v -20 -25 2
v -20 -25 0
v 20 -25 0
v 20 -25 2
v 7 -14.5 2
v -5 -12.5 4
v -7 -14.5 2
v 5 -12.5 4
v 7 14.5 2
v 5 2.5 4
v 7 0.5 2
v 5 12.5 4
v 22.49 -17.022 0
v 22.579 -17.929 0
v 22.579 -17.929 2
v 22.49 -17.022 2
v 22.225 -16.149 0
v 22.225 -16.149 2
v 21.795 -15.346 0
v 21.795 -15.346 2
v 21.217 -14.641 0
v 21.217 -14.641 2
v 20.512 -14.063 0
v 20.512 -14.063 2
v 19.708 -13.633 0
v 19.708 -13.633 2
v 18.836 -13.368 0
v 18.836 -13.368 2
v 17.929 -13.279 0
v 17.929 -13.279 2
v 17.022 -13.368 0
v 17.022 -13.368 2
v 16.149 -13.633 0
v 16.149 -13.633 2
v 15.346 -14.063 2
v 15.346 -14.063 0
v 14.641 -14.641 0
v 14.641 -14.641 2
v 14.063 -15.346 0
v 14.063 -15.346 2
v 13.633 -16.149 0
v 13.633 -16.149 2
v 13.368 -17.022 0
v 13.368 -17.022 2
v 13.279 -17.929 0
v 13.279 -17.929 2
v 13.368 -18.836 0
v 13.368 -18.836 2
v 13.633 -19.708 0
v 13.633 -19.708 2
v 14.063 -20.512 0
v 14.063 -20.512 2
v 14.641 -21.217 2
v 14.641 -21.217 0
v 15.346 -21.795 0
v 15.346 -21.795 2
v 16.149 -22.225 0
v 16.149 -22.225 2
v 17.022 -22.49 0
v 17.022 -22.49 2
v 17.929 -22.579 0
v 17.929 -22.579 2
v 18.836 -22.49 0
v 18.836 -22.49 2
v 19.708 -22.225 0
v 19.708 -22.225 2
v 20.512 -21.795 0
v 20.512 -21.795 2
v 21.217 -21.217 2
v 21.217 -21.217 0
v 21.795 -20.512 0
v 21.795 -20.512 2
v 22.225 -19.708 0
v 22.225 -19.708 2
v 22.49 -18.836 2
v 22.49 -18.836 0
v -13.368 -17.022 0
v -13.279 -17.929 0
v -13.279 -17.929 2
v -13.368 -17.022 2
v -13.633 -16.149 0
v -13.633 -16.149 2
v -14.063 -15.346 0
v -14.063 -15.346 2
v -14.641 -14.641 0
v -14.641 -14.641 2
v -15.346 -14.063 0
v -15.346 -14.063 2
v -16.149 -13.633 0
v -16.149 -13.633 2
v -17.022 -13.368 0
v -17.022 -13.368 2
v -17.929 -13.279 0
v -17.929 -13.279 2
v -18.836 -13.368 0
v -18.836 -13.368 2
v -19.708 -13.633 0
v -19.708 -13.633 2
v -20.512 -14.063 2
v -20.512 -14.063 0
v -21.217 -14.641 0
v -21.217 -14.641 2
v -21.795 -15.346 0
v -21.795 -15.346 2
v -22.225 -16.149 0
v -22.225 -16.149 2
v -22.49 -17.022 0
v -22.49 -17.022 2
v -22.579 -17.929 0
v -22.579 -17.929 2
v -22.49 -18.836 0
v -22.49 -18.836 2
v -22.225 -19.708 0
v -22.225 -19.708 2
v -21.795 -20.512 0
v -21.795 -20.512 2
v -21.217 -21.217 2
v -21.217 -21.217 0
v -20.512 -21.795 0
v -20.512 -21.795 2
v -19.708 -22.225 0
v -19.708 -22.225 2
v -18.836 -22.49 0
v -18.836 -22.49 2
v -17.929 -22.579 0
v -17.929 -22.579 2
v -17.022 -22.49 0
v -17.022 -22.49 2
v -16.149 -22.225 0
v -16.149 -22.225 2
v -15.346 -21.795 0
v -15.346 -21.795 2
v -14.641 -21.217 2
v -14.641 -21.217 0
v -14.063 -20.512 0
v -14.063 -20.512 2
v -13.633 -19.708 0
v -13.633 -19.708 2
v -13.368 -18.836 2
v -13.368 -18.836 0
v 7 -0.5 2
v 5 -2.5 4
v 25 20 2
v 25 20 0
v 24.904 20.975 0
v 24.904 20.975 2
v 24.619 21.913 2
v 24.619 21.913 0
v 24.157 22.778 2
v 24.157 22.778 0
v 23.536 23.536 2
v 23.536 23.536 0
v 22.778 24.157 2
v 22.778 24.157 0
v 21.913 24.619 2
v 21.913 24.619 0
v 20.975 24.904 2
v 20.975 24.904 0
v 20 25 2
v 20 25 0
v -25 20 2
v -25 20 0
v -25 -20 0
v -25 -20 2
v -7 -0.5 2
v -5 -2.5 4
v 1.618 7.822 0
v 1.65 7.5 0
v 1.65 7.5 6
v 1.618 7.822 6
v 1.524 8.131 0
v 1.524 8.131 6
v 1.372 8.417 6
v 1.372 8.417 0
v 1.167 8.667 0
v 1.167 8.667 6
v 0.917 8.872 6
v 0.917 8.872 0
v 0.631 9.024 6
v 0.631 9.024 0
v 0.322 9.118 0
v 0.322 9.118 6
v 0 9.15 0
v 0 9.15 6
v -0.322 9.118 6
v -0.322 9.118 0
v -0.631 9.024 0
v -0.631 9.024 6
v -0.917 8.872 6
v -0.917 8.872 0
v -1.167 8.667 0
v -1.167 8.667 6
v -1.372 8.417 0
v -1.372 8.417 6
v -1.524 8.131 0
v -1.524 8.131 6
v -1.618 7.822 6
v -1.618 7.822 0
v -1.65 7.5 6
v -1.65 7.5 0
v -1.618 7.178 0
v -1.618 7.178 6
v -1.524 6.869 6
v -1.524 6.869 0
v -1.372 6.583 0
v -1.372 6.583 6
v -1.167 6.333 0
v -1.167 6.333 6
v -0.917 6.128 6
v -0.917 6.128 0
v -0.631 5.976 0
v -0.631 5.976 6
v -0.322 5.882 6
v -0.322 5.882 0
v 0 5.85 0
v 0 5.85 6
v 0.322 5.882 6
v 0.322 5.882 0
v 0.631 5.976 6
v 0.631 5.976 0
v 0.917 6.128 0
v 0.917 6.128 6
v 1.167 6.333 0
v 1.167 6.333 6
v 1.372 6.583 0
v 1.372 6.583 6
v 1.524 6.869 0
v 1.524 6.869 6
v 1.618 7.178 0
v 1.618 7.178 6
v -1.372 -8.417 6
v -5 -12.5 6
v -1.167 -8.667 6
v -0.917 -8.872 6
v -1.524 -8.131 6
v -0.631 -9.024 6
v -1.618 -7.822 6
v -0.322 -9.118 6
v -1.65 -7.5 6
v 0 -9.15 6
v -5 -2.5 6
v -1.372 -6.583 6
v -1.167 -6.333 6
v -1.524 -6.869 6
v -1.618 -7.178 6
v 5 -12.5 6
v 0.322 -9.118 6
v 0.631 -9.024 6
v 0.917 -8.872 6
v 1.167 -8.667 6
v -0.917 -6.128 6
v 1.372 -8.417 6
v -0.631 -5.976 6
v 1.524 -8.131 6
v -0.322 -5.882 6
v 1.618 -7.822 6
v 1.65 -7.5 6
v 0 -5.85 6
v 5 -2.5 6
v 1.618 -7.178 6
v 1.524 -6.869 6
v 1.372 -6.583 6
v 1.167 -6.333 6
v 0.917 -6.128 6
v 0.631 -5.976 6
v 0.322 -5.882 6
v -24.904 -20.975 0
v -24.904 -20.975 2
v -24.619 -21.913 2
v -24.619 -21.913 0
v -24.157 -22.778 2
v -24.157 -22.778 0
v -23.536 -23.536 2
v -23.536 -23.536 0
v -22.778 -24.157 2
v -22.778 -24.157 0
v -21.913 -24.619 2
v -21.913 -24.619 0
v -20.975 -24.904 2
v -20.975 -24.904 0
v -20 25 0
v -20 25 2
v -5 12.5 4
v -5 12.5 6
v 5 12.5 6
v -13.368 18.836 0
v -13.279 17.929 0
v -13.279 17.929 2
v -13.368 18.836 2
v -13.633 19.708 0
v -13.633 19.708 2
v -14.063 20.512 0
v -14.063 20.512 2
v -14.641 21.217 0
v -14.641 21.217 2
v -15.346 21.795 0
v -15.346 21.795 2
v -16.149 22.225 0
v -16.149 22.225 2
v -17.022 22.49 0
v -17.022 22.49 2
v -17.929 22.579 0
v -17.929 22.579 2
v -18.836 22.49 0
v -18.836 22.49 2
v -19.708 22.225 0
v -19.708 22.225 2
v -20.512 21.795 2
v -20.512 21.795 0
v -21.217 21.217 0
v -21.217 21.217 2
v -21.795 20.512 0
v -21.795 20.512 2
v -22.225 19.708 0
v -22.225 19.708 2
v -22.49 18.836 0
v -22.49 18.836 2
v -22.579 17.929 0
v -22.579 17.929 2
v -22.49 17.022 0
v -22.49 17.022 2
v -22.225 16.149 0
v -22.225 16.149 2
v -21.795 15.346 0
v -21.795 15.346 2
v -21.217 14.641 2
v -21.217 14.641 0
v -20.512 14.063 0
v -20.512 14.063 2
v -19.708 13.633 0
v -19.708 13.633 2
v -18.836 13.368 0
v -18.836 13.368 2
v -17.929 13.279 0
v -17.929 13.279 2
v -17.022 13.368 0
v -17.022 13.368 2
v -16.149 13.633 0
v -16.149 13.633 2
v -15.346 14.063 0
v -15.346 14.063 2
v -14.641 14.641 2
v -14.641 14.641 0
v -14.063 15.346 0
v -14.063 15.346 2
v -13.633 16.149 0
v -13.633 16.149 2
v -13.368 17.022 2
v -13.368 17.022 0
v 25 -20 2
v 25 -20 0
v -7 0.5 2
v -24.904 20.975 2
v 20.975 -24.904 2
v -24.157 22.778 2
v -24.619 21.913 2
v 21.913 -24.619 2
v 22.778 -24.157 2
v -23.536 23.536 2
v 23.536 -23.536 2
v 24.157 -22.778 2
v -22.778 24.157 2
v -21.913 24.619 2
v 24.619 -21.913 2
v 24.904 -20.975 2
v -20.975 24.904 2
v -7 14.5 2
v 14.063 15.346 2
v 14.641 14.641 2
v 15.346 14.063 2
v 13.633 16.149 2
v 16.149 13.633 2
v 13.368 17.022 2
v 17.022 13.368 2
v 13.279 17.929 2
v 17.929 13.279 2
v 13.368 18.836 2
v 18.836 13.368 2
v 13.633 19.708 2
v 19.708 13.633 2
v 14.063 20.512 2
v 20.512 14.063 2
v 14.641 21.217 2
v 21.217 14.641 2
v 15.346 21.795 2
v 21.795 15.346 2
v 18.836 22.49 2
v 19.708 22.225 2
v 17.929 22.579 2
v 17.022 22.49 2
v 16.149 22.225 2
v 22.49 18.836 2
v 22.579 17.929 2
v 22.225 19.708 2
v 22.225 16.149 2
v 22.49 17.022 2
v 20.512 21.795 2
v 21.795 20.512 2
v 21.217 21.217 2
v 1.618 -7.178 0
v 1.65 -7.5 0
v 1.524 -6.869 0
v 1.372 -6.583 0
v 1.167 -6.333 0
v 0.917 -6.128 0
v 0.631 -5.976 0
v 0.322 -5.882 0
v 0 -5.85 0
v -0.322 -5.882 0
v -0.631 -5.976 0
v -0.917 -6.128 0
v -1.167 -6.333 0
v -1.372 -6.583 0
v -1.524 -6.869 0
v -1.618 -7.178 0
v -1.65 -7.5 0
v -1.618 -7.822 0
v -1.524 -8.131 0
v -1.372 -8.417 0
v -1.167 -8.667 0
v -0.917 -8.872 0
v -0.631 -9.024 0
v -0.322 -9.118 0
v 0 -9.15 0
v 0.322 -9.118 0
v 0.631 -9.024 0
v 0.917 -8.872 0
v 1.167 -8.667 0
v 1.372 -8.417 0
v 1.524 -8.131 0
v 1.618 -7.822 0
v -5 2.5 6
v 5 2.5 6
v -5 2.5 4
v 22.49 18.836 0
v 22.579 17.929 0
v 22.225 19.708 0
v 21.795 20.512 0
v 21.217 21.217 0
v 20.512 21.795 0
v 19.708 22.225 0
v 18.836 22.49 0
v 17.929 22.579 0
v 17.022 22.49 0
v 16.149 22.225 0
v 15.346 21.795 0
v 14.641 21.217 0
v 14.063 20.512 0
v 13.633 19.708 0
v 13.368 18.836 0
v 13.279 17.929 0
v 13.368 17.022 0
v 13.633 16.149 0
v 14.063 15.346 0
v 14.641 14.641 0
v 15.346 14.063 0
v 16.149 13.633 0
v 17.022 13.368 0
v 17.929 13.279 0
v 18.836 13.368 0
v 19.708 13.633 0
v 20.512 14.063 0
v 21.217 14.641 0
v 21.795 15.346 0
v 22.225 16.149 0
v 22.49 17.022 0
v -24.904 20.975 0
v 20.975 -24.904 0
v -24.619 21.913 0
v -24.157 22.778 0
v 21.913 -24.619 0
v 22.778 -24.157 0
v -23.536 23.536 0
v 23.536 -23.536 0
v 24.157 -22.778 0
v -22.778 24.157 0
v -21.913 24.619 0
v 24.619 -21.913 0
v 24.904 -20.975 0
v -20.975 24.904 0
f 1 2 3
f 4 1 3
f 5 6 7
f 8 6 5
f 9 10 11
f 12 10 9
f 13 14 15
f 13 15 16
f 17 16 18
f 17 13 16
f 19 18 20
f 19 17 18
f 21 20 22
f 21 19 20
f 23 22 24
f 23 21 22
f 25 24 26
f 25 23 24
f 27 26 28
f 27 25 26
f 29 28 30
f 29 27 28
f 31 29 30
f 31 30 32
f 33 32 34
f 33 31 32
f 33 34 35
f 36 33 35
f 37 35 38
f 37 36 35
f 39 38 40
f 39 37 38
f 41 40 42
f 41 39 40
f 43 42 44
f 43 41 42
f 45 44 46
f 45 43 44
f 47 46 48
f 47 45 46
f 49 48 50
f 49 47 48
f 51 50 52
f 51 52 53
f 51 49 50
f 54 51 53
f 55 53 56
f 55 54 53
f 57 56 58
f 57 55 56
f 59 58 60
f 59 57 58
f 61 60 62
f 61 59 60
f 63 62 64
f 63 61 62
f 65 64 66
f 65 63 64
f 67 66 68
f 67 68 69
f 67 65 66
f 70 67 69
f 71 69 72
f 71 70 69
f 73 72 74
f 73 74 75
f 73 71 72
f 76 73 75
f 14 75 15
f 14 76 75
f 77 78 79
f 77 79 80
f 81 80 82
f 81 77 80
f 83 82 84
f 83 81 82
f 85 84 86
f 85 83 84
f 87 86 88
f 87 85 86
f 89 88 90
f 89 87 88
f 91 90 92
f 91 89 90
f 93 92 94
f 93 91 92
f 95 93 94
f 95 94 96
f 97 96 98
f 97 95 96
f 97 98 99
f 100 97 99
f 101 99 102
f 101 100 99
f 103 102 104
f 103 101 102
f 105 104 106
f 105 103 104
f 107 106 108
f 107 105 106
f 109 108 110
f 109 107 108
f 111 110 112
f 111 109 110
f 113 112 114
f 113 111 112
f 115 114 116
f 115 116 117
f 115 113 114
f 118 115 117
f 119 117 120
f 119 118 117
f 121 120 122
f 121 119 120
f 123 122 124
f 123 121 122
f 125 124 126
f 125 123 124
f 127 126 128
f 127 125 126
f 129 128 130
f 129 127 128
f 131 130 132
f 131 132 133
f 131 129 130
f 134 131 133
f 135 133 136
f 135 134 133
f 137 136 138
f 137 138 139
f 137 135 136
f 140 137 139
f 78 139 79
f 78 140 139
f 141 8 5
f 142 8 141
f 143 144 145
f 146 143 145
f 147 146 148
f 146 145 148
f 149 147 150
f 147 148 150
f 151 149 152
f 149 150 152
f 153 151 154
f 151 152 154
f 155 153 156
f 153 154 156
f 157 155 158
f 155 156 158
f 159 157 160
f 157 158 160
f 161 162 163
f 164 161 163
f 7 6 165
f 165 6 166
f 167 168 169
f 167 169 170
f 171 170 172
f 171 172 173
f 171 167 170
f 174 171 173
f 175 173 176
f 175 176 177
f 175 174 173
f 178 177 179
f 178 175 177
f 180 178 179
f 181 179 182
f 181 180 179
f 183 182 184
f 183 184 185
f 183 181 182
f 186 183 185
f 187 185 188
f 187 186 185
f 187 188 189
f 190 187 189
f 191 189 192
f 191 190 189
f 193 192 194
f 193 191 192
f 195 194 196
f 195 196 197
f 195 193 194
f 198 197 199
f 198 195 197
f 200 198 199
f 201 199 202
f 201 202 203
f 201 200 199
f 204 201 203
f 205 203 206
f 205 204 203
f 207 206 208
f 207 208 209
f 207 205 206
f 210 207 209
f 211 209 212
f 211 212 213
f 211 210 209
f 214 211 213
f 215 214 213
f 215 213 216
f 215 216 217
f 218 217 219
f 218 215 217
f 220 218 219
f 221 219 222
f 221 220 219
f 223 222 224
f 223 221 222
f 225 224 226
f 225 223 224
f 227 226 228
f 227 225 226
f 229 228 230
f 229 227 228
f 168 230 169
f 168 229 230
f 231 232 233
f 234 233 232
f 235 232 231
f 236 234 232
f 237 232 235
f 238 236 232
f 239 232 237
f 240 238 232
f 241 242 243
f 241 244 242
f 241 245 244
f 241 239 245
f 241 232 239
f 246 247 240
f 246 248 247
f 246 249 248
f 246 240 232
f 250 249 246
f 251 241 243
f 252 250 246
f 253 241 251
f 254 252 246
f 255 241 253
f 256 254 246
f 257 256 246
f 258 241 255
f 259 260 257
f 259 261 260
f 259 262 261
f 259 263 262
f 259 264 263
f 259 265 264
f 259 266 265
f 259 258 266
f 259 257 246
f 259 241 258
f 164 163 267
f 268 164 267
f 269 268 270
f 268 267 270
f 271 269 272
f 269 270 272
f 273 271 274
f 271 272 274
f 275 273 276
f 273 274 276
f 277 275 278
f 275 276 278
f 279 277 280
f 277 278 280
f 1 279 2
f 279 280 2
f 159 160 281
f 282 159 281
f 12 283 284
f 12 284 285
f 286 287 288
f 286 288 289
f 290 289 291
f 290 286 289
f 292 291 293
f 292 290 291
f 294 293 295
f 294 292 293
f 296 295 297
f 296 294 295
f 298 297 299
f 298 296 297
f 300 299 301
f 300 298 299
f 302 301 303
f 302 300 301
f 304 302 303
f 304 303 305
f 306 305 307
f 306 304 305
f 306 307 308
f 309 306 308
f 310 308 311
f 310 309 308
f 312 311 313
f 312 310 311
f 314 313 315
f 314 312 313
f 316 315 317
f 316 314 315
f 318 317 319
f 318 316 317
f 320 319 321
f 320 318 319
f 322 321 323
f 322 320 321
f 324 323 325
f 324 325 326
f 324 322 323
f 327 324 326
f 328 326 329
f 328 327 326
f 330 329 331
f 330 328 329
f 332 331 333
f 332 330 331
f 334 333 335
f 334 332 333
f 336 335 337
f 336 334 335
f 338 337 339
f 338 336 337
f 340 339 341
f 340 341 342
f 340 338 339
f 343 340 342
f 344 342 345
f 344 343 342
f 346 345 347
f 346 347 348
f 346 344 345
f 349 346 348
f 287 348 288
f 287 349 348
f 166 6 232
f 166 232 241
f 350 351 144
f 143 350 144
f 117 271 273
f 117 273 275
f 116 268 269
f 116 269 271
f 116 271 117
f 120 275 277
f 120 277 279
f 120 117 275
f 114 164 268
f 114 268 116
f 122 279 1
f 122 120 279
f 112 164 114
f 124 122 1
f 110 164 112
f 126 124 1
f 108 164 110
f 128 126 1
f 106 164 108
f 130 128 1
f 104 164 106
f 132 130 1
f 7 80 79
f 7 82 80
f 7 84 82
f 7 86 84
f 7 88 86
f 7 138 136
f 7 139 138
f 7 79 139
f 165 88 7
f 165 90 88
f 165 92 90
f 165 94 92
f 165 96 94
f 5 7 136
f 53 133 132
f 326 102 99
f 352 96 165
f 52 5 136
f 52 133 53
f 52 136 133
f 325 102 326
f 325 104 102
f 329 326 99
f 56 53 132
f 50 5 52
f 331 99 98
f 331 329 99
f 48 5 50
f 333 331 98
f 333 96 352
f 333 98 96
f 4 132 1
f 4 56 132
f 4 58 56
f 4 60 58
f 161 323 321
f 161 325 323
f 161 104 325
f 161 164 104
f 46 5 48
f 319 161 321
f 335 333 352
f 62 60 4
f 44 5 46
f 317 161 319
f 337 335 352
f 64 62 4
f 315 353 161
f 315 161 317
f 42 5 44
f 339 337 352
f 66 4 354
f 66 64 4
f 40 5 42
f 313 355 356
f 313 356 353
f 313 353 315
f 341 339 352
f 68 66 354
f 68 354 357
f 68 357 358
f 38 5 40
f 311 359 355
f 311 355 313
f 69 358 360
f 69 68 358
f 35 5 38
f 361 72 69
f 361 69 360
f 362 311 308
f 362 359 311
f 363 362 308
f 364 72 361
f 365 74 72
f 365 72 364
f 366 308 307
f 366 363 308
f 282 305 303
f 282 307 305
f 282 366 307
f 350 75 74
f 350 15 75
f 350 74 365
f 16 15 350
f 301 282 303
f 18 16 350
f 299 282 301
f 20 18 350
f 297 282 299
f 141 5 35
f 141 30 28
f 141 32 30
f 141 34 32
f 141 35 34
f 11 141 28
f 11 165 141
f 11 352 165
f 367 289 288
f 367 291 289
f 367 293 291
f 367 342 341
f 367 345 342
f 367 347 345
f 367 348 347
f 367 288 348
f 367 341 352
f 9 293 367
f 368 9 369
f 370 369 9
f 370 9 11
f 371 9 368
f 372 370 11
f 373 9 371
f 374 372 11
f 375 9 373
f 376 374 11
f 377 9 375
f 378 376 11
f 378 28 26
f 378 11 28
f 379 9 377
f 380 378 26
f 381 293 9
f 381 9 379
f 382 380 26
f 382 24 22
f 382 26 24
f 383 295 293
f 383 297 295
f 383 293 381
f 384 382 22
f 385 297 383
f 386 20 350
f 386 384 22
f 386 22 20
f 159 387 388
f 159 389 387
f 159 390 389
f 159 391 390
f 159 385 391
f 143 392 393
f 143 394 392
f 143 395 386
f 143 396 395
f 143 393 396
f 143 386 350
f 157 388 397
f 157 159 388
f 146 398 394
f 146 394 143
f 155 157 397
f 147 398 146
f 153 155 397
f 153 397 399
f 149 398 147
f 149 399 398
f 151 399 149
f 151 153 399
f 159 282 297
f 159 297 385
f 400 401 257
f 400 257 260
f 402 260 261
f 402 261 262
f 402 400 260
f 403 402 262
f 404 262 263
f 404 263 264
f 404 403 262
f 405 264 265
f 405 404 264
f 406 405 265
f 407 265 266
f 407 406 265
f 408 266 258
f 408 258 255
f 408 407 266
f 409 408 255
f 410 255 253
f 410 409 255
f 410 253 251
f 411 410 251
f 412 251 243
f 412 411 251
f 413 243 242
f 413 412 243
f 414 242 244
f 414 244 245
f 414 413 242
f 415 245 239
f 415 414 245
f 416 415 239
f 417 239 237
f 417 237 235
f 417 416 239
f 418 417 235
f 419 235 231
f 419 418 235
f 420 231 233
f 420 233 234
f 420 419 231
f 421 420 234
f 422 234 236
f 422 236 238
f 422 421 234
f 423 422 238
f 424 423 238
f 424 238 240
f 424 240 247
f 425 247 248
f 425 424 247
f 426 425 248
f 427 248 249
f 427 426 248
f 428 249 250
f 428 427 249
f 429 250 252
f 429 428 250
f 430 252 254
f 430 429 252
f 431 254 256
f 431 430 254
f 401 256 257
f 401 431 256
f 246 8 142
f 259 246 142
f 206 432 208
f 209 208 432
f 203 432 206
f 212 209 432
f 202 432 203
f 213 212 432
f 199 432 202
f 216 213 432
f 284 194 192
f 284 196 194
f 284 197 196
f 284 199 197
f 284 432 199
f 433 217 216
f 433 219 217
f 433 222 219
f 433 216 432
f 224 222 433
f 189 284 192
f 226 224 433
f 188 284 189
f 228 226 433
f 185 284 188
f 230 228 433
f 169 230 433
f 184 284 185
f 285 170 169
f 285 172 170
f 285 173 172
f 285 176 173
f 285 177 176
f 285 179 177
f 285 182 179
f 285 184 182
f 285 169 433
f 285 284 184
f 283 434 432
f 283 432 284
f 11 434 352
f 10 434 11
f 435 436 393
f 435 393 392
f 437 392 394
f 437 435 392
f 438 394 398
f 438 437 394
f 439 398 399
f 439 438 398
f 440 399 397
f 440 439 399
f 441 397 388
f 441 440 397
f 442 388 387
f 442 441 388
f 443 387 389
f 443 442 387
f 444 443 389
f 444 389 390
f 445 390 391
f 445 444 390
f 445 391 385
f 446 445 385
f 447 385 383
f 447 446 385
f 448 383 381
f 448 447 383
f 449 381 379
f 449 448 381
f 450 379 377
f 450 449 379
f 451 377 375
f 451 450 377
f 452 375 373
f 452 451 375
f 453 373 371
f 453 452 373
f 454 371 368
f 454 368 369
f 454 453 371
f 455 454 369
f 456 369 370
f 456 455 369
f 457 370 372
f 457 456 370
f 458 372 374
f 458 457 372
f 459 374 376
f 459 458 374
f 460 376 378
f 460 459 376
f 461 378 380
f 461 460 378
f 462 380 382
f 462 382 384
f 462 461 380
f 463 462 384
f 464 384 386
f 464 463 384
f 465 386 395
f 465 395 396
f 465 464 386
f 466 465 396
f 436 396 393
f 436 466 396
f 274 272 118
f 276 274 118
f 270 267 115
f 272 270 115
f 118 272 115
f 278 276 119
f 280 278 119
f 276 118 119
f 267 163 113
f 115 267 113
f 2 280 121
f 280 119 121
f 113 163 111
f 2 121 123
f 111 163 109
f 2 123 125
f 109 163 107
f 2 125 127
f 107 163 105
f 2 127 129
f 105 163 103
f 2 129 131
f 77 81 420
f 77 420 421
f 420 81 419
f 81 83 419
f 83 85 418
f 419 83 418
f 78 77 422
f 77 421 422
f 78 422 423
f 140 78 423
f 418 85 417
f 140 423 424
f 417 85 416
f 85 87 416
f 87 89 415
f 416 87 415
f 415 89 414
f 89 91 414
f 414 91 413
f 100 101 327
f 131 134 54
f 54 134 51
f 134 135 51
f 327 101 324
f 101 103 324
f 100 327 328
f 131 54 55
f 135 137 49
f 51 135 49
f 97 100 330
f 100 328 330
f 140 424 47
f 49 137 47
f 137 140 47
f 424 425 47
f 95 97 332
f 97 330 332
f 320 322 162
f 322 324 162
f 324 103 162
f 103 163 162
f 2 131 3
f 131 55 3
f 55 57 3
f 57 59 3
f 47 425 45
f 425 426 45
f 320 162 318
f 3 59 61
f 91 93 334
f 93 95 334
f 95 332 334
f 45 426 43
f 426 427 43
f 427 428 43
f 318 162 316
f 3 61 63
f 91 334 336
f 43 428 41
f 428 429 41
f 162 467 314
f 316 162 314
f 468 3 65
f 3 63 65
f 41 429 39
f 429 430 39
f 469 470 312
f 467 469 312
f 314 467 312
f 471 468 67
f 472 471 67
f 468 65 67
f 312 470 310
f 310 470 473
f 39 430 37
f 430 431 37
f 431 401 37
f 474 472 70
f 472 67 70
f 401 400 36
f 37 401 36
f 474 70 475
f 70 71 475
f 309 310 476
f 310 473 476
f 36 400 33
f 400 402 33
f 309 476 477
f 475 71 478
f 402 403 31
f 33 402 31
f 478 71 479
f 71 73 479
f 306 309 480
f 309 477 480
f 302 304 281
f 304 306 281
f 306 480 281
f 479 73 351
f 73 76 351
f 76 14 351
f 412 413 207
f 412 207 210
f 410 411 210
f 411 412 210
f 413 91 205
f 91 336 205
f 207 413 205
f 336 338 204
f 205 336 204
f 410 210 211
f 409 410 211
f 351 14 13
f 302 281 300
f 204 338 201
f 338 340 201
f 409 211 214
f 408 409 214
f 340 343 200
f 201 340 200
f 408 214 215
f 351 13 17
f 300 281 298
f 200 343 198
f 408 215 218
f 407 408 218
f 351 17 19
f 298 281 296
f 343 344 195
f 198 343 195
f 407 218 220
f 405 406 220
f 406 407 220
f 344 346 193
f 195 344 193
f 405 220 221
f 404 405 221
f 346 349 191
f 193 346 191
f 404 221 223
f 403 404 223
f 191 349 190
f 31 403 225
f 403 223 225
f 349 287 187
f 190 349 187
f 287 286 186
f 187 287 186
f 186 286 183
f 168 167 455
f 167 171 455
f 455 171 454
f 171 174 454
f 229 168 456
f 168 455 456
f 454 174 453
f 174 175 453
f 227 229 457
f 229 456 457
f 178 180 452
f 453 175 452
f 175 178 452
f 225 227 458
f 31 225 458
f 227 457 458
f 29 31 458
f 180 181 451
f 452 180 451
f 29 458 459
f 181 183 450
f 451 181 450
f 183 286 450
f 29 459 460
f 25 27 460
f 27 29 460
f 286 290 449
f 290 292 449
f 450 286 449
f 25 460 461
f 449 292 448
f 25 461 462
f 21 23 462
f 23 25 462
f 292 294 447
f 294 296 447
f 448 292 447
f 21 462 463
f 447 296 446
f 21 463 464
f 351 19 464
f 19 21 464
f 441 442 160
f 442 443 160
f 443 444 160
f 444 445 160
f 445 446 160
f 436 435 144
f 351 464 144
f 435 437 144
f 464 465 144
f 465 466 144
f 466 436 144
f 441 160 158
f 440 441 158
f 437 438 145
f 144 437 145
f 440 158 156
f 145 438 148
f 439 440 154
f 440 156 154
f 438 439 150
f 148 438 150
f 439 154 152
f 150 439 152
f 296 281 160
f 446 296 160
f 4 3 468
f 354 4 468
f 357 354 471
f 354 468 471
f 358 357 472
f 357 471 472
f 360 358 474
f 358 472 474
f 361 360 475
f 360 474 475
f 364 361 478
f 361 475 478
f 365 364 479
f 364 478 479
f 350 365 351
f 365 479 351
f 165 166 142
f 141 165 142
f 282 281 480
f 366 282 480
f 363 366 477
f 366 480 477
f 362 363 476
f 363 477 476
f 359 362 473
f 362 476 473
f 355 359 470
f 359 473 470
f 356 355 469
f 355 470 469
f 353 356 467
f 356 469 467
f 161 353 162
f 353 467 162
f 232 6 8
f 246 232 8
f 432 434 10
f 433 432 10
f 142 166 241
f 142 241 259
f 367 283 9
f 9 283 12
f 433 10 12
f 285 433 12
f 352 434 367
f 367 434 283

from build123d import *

# Parameters (mm, degrees)
F0_W     = 10
F0_H     = 10
F0_R     = 1.65
F1_DEPTH = 6
F0_R_2   = 4.65
F2_DEPTH = 2
F3_SIZE  = 2


with BuildPart() as f1:
    # F0 (on Top) → F1 (new body)
    with BuildSketch(Plane.XY):
        with Locations((0, 7.5)):
            Rectangle(F0_W, F0_H)
        with Locations((0, 7.5)):
            Circle(F0_R, mode=Mode.SUBTRACT)
    extrude(amount=F1_DEPTH)



with BuildPart() as f1b:
    # F0 (on Top) → F1, piece 2 (new body)
    with BuildSketch(Plane.XY):
        with Locations((0, -7.5)):
            Rectangle(F0_W, F0_H)
        with Locations((0, -7.5)):
            Circle(F0_R, mode=Mode.SUBTRACT)
    extrude(amount=F1_DEPTH)


with BuildPart() as f1_1:
    add(f1.part)

    add(f1b.part)  # F2 merges F1b
    # F0 (on Top) → F2 (join)
    with BuildSketch(Plane.XY):
        with BuildLine():
            Line((20, 25), (-20, 25))
            ThreePointArc((-20, 25), (-23.5355339059, 23.5355339059), (-25, 20))
            Line((-25, 20), (-25, -20))
            ThreePointArc((-25, -20), (-23.5355339059, -23.5355339059), (-20, -25))
            Line((-20, -25), (20, -25))
            ThreePointArc((20, -25), (23.5355339059, -23.5355339059), (25, -20))
            Line((25, -20), (25, 20))
            ThreePointArc((25, 20), (23.5355339059, 23.5355339059), (20, 25))
        make_face()
        with Locations((-17.9289321881, -17.9289321881)):
            Circle(F0_R_2, mode=Mode.SUBTRACT)
        with Locations((17.9289321881, -17.9289321881)):
            Circle(F0_R_2, mode=Mode.SUBTRACT)
        with Locations((0, -7.5)):
            Rectangle(F0_W, F0_H, mode=Mode.SUBTRACT)
        with Locations((-17.9289321881, 17.9289321881)):
            Circle(F0_R_2, mode=Mode.SUBTRACT)
        with Locations((0, 7.5)):
            Rectangle(F0_W, F0_H, mode=Mode.SUBTRACT)
        with Locations((17.9289321881, 17.9289321881)):
            Circle(F0_R_2, mode=Mode.SUBTRACT)
    extrude(amount=F2_DEPTH)

    # F3
    f3_edges = [f1_1.edges().sort_by_distance(p)[0] for p in [
        (0, -12.5, 2),
        (5, -7.5, 2),
        (5, 7.5, 2),
        (0, 2.5, 2),
        (0, -2.5, 2),
        (0, 12.5, 2),
        (-5, 7.5, 2),
        (-5, -7.5, 2),
    ]]
    chamfer(f3_edges, length=F3_SIZE)


solid = f1_1.part
